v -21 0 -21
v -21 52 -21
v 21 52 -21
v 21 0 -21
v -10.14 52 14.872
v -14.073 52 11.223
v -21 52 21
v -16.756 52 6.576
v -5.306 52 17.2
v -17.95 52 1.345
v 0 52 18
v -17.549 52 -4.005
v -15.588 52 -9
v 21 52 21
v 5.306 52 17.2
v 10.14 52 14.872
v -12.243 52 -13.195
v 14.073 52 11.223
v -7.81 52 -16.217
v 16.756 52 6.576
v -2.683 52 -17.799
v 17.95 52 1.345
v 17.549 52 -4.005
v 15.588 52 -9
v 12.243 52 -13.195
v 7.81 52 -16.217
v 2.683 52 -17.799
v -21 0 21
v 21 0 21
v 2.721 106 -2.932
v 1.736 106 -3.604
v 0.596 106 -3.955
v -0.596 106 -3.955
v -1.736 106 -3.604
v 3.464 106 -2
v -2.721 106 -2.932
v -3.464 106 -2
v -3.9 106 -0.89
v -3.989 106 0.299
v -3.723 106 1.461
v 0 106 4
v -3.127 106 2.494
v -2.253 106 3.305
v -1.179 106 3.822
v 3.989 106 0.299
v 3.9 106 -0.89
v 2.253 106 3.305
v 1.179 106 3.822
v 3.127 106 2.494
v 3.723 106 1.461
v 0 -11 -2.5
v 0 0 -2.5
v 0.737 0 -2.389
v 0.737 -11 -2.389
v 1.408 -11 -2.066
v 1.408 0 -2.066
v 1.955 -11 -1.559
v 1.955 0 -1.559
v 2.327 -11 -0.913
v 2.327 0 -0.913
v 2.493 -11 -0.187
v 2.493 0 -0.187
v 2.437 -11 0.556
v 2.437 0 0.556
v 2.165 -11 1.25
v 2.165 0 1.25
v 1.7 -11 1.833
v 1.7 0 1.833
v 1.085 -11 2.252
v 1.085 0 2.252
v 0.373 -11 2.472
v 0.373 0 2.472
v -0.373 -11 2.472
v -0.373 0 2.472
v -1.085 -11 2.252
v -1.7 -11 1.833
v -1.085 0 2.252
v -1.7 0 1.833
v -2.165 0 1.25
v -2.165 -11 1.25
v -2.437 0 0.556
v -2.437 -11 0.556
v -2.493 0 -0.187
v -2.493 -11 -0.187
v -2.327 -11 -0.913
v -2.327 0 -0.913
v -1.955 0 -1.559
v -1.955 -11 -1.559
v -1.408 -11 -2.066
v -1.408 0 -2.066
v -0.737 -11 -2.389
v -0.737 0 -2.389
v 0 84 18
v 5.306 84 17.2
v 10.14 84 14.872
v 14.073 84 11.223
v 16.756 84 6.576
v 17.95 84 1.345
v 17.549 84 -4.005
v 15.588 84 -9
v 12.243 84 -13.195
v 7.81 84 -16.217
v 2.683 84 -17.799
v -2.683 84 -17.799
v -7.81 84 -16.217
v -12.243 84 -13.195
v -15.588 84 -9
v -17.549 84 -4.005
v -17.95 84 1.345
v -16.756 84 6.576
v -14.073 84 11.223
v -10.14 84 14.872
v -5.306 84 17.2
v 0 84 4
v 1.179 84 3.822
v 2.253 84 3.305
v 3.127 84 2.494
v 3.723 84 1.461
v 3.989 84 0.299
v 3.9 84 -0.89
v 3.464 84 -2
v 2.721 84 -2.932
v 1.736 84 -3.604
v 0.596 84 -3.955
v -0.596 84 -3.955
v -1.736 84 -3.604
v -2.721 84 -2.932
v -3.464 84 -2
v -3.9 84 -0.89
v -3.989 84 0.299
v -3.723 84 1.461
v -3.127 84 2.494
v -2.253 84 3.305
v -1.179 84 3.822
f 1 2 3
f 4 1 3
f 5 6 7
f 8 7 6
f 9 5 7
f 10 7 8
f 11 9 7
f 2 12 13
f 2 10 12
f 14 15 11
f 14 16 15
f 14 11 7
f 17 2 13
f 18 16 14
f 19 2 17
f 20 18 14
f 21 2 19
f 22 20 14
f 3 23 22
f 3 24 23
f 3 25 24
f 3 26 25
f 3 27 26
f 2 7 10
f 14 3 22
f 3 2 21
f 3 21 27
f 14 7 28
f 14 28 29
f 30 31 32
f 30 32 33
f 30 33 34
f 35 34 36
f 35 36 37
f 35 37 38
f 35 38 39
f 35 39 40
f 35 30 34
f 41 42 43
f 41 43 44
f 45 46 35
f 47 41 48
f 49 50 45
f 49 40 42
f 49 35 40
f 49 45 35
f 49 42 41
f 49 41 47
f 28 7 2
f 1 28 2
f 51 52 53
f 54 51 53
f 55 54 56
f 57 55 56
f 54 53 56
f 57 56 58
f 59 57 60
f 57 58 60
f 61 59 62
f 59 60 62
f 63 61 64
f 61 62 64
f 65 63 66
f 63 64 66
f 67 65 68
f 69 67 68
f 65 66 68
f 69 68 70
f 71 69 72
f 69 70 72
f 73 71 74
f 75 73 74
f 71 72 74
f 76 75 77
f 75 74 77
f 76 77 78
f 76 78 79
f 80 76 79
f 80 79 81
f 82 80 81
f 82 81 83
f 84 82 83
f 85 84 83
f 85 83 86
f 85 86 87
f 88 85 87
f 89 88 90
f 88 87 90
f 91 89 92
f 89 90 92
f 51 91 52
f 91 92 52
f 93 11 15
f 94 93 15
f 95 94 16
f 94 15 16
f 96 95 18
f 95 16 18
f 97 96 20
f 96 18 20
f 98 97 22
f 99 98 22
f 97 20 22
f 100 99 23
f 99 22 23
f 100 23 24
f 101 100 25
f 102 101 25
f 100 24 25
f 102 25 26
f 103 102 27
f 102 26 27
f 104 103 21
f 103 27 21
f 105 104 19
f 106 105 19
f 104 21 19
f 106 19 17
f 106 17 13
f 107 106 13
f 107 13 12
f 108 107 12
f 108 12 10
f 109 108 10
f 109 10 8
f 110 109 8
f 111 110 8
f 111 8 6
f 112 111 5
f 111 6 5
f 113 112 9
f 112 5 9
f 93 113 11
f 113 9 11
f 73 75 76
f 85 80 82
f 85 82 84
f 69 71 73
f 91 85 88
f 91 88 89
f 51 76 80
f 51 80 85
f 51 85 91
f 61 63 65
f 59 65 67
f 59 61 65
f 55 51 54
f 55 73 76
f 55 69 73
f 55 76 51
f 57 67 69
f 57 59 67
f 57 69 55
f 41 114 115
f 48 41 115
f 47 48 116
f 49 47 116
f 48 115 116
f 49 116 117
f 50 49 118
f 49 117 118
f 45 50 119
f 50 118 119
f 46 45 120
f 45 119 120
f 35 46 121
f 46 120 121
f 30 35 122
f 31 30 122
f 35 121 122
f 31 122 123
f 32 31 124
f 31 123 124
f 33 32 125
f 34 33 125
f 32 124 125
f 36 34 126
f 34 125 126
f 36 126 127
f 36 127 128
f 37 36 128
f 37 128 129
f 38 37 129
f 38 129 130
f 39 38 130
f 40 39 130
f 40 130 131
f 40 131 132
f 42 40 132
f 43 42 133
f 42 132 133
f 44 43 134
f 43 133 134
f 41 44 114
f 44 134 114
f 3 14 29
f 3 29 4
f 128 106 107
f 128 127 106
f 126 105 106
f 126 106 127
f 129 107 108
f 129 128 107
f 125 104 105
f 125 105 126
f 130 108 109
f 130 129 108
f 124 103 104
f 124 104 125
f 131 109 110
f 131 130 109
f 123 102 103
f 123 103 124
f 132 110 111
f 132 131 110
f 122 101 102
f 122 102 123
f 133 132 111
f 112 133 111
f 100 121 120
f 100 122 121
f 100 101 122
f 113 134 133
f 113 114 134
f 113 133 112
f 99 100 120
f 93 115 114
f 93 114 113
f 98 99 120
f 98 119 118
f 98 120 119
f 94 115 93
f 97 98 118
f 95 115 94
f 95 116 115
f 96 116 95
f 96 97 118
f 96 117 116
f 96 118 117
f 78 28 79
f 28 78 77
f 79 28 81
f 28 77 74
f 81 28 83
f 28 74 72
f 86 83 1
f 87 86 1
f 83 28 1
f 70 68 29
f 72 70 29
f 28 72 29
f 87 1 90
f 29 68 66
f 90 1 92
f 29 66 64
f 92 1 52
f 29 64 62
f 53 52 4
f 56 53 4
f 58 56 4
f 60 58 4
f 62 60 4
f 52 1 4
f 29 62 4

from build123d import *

# Parameters (mm, degrees)
SKETCH1_W           = 42
SKETCH1_H           = 42
BOSS_EXTRUDE1_DEPTH = 52
SKETCH2_R           = 18
BOSS_EXTRUDE2_DEPTH = 32
SKETCH3_R           = 4
BOSS_EXTRUDE3_DEPTH = 22
SKETCH4_R           = 2.5
BOSS_EXTRUDE4_DEPTH = 11


with BuildPart() as part:
    # Sketch1 → Boss-Extrude1 (new body)
    with BuildSketch(Plane(origin=(0, 0, 0), x_dir=(1, 0, 0), z_dir=(0, 1, 0))):
        Rectangle(SKETCH1_W, SKETCH1_H)
    extrude(amount=BOSS_EXTRUDE1_DEPTH)

    # Sketch2 → Boss-Extrude2 (add)
    with BuildSketch(Plane(origin=(0, 52, 0), x_dir=(1, 0, 0), z_dir=(0, 1, 0))):
        with Locations(Location((0, 0, 0), (0, 0, 270))):
            Circle(SKETCH2_R)
    extrude(amount=BOSS_EXTRUDE2_DEPTH)

    # Sketch3 → Boss-Extrude3 (add)
    with BuildSketch(Plane(origin=(0, 84, 0), x_dir=(1, 0, 0), z_dir=(0, 1, 0))):
        with Locations(Location((0, 0, 0), (0, 0, 270))):
            Circle(SKETCH3_R)
    extrude(amount=BOSS_EXTRUDE3_DEPTH)

    # Sketch4 → Boss-Extrude4 (add)
    with BuildSketch(Plane.XZ):
        with Locations(Location((0, 0, 0), (0, 0, 270))):
            Circle(SKETCH4_R)
    extrude(amount=BOSS_EXTRUDE4_DEPTH)


solid = part.part
